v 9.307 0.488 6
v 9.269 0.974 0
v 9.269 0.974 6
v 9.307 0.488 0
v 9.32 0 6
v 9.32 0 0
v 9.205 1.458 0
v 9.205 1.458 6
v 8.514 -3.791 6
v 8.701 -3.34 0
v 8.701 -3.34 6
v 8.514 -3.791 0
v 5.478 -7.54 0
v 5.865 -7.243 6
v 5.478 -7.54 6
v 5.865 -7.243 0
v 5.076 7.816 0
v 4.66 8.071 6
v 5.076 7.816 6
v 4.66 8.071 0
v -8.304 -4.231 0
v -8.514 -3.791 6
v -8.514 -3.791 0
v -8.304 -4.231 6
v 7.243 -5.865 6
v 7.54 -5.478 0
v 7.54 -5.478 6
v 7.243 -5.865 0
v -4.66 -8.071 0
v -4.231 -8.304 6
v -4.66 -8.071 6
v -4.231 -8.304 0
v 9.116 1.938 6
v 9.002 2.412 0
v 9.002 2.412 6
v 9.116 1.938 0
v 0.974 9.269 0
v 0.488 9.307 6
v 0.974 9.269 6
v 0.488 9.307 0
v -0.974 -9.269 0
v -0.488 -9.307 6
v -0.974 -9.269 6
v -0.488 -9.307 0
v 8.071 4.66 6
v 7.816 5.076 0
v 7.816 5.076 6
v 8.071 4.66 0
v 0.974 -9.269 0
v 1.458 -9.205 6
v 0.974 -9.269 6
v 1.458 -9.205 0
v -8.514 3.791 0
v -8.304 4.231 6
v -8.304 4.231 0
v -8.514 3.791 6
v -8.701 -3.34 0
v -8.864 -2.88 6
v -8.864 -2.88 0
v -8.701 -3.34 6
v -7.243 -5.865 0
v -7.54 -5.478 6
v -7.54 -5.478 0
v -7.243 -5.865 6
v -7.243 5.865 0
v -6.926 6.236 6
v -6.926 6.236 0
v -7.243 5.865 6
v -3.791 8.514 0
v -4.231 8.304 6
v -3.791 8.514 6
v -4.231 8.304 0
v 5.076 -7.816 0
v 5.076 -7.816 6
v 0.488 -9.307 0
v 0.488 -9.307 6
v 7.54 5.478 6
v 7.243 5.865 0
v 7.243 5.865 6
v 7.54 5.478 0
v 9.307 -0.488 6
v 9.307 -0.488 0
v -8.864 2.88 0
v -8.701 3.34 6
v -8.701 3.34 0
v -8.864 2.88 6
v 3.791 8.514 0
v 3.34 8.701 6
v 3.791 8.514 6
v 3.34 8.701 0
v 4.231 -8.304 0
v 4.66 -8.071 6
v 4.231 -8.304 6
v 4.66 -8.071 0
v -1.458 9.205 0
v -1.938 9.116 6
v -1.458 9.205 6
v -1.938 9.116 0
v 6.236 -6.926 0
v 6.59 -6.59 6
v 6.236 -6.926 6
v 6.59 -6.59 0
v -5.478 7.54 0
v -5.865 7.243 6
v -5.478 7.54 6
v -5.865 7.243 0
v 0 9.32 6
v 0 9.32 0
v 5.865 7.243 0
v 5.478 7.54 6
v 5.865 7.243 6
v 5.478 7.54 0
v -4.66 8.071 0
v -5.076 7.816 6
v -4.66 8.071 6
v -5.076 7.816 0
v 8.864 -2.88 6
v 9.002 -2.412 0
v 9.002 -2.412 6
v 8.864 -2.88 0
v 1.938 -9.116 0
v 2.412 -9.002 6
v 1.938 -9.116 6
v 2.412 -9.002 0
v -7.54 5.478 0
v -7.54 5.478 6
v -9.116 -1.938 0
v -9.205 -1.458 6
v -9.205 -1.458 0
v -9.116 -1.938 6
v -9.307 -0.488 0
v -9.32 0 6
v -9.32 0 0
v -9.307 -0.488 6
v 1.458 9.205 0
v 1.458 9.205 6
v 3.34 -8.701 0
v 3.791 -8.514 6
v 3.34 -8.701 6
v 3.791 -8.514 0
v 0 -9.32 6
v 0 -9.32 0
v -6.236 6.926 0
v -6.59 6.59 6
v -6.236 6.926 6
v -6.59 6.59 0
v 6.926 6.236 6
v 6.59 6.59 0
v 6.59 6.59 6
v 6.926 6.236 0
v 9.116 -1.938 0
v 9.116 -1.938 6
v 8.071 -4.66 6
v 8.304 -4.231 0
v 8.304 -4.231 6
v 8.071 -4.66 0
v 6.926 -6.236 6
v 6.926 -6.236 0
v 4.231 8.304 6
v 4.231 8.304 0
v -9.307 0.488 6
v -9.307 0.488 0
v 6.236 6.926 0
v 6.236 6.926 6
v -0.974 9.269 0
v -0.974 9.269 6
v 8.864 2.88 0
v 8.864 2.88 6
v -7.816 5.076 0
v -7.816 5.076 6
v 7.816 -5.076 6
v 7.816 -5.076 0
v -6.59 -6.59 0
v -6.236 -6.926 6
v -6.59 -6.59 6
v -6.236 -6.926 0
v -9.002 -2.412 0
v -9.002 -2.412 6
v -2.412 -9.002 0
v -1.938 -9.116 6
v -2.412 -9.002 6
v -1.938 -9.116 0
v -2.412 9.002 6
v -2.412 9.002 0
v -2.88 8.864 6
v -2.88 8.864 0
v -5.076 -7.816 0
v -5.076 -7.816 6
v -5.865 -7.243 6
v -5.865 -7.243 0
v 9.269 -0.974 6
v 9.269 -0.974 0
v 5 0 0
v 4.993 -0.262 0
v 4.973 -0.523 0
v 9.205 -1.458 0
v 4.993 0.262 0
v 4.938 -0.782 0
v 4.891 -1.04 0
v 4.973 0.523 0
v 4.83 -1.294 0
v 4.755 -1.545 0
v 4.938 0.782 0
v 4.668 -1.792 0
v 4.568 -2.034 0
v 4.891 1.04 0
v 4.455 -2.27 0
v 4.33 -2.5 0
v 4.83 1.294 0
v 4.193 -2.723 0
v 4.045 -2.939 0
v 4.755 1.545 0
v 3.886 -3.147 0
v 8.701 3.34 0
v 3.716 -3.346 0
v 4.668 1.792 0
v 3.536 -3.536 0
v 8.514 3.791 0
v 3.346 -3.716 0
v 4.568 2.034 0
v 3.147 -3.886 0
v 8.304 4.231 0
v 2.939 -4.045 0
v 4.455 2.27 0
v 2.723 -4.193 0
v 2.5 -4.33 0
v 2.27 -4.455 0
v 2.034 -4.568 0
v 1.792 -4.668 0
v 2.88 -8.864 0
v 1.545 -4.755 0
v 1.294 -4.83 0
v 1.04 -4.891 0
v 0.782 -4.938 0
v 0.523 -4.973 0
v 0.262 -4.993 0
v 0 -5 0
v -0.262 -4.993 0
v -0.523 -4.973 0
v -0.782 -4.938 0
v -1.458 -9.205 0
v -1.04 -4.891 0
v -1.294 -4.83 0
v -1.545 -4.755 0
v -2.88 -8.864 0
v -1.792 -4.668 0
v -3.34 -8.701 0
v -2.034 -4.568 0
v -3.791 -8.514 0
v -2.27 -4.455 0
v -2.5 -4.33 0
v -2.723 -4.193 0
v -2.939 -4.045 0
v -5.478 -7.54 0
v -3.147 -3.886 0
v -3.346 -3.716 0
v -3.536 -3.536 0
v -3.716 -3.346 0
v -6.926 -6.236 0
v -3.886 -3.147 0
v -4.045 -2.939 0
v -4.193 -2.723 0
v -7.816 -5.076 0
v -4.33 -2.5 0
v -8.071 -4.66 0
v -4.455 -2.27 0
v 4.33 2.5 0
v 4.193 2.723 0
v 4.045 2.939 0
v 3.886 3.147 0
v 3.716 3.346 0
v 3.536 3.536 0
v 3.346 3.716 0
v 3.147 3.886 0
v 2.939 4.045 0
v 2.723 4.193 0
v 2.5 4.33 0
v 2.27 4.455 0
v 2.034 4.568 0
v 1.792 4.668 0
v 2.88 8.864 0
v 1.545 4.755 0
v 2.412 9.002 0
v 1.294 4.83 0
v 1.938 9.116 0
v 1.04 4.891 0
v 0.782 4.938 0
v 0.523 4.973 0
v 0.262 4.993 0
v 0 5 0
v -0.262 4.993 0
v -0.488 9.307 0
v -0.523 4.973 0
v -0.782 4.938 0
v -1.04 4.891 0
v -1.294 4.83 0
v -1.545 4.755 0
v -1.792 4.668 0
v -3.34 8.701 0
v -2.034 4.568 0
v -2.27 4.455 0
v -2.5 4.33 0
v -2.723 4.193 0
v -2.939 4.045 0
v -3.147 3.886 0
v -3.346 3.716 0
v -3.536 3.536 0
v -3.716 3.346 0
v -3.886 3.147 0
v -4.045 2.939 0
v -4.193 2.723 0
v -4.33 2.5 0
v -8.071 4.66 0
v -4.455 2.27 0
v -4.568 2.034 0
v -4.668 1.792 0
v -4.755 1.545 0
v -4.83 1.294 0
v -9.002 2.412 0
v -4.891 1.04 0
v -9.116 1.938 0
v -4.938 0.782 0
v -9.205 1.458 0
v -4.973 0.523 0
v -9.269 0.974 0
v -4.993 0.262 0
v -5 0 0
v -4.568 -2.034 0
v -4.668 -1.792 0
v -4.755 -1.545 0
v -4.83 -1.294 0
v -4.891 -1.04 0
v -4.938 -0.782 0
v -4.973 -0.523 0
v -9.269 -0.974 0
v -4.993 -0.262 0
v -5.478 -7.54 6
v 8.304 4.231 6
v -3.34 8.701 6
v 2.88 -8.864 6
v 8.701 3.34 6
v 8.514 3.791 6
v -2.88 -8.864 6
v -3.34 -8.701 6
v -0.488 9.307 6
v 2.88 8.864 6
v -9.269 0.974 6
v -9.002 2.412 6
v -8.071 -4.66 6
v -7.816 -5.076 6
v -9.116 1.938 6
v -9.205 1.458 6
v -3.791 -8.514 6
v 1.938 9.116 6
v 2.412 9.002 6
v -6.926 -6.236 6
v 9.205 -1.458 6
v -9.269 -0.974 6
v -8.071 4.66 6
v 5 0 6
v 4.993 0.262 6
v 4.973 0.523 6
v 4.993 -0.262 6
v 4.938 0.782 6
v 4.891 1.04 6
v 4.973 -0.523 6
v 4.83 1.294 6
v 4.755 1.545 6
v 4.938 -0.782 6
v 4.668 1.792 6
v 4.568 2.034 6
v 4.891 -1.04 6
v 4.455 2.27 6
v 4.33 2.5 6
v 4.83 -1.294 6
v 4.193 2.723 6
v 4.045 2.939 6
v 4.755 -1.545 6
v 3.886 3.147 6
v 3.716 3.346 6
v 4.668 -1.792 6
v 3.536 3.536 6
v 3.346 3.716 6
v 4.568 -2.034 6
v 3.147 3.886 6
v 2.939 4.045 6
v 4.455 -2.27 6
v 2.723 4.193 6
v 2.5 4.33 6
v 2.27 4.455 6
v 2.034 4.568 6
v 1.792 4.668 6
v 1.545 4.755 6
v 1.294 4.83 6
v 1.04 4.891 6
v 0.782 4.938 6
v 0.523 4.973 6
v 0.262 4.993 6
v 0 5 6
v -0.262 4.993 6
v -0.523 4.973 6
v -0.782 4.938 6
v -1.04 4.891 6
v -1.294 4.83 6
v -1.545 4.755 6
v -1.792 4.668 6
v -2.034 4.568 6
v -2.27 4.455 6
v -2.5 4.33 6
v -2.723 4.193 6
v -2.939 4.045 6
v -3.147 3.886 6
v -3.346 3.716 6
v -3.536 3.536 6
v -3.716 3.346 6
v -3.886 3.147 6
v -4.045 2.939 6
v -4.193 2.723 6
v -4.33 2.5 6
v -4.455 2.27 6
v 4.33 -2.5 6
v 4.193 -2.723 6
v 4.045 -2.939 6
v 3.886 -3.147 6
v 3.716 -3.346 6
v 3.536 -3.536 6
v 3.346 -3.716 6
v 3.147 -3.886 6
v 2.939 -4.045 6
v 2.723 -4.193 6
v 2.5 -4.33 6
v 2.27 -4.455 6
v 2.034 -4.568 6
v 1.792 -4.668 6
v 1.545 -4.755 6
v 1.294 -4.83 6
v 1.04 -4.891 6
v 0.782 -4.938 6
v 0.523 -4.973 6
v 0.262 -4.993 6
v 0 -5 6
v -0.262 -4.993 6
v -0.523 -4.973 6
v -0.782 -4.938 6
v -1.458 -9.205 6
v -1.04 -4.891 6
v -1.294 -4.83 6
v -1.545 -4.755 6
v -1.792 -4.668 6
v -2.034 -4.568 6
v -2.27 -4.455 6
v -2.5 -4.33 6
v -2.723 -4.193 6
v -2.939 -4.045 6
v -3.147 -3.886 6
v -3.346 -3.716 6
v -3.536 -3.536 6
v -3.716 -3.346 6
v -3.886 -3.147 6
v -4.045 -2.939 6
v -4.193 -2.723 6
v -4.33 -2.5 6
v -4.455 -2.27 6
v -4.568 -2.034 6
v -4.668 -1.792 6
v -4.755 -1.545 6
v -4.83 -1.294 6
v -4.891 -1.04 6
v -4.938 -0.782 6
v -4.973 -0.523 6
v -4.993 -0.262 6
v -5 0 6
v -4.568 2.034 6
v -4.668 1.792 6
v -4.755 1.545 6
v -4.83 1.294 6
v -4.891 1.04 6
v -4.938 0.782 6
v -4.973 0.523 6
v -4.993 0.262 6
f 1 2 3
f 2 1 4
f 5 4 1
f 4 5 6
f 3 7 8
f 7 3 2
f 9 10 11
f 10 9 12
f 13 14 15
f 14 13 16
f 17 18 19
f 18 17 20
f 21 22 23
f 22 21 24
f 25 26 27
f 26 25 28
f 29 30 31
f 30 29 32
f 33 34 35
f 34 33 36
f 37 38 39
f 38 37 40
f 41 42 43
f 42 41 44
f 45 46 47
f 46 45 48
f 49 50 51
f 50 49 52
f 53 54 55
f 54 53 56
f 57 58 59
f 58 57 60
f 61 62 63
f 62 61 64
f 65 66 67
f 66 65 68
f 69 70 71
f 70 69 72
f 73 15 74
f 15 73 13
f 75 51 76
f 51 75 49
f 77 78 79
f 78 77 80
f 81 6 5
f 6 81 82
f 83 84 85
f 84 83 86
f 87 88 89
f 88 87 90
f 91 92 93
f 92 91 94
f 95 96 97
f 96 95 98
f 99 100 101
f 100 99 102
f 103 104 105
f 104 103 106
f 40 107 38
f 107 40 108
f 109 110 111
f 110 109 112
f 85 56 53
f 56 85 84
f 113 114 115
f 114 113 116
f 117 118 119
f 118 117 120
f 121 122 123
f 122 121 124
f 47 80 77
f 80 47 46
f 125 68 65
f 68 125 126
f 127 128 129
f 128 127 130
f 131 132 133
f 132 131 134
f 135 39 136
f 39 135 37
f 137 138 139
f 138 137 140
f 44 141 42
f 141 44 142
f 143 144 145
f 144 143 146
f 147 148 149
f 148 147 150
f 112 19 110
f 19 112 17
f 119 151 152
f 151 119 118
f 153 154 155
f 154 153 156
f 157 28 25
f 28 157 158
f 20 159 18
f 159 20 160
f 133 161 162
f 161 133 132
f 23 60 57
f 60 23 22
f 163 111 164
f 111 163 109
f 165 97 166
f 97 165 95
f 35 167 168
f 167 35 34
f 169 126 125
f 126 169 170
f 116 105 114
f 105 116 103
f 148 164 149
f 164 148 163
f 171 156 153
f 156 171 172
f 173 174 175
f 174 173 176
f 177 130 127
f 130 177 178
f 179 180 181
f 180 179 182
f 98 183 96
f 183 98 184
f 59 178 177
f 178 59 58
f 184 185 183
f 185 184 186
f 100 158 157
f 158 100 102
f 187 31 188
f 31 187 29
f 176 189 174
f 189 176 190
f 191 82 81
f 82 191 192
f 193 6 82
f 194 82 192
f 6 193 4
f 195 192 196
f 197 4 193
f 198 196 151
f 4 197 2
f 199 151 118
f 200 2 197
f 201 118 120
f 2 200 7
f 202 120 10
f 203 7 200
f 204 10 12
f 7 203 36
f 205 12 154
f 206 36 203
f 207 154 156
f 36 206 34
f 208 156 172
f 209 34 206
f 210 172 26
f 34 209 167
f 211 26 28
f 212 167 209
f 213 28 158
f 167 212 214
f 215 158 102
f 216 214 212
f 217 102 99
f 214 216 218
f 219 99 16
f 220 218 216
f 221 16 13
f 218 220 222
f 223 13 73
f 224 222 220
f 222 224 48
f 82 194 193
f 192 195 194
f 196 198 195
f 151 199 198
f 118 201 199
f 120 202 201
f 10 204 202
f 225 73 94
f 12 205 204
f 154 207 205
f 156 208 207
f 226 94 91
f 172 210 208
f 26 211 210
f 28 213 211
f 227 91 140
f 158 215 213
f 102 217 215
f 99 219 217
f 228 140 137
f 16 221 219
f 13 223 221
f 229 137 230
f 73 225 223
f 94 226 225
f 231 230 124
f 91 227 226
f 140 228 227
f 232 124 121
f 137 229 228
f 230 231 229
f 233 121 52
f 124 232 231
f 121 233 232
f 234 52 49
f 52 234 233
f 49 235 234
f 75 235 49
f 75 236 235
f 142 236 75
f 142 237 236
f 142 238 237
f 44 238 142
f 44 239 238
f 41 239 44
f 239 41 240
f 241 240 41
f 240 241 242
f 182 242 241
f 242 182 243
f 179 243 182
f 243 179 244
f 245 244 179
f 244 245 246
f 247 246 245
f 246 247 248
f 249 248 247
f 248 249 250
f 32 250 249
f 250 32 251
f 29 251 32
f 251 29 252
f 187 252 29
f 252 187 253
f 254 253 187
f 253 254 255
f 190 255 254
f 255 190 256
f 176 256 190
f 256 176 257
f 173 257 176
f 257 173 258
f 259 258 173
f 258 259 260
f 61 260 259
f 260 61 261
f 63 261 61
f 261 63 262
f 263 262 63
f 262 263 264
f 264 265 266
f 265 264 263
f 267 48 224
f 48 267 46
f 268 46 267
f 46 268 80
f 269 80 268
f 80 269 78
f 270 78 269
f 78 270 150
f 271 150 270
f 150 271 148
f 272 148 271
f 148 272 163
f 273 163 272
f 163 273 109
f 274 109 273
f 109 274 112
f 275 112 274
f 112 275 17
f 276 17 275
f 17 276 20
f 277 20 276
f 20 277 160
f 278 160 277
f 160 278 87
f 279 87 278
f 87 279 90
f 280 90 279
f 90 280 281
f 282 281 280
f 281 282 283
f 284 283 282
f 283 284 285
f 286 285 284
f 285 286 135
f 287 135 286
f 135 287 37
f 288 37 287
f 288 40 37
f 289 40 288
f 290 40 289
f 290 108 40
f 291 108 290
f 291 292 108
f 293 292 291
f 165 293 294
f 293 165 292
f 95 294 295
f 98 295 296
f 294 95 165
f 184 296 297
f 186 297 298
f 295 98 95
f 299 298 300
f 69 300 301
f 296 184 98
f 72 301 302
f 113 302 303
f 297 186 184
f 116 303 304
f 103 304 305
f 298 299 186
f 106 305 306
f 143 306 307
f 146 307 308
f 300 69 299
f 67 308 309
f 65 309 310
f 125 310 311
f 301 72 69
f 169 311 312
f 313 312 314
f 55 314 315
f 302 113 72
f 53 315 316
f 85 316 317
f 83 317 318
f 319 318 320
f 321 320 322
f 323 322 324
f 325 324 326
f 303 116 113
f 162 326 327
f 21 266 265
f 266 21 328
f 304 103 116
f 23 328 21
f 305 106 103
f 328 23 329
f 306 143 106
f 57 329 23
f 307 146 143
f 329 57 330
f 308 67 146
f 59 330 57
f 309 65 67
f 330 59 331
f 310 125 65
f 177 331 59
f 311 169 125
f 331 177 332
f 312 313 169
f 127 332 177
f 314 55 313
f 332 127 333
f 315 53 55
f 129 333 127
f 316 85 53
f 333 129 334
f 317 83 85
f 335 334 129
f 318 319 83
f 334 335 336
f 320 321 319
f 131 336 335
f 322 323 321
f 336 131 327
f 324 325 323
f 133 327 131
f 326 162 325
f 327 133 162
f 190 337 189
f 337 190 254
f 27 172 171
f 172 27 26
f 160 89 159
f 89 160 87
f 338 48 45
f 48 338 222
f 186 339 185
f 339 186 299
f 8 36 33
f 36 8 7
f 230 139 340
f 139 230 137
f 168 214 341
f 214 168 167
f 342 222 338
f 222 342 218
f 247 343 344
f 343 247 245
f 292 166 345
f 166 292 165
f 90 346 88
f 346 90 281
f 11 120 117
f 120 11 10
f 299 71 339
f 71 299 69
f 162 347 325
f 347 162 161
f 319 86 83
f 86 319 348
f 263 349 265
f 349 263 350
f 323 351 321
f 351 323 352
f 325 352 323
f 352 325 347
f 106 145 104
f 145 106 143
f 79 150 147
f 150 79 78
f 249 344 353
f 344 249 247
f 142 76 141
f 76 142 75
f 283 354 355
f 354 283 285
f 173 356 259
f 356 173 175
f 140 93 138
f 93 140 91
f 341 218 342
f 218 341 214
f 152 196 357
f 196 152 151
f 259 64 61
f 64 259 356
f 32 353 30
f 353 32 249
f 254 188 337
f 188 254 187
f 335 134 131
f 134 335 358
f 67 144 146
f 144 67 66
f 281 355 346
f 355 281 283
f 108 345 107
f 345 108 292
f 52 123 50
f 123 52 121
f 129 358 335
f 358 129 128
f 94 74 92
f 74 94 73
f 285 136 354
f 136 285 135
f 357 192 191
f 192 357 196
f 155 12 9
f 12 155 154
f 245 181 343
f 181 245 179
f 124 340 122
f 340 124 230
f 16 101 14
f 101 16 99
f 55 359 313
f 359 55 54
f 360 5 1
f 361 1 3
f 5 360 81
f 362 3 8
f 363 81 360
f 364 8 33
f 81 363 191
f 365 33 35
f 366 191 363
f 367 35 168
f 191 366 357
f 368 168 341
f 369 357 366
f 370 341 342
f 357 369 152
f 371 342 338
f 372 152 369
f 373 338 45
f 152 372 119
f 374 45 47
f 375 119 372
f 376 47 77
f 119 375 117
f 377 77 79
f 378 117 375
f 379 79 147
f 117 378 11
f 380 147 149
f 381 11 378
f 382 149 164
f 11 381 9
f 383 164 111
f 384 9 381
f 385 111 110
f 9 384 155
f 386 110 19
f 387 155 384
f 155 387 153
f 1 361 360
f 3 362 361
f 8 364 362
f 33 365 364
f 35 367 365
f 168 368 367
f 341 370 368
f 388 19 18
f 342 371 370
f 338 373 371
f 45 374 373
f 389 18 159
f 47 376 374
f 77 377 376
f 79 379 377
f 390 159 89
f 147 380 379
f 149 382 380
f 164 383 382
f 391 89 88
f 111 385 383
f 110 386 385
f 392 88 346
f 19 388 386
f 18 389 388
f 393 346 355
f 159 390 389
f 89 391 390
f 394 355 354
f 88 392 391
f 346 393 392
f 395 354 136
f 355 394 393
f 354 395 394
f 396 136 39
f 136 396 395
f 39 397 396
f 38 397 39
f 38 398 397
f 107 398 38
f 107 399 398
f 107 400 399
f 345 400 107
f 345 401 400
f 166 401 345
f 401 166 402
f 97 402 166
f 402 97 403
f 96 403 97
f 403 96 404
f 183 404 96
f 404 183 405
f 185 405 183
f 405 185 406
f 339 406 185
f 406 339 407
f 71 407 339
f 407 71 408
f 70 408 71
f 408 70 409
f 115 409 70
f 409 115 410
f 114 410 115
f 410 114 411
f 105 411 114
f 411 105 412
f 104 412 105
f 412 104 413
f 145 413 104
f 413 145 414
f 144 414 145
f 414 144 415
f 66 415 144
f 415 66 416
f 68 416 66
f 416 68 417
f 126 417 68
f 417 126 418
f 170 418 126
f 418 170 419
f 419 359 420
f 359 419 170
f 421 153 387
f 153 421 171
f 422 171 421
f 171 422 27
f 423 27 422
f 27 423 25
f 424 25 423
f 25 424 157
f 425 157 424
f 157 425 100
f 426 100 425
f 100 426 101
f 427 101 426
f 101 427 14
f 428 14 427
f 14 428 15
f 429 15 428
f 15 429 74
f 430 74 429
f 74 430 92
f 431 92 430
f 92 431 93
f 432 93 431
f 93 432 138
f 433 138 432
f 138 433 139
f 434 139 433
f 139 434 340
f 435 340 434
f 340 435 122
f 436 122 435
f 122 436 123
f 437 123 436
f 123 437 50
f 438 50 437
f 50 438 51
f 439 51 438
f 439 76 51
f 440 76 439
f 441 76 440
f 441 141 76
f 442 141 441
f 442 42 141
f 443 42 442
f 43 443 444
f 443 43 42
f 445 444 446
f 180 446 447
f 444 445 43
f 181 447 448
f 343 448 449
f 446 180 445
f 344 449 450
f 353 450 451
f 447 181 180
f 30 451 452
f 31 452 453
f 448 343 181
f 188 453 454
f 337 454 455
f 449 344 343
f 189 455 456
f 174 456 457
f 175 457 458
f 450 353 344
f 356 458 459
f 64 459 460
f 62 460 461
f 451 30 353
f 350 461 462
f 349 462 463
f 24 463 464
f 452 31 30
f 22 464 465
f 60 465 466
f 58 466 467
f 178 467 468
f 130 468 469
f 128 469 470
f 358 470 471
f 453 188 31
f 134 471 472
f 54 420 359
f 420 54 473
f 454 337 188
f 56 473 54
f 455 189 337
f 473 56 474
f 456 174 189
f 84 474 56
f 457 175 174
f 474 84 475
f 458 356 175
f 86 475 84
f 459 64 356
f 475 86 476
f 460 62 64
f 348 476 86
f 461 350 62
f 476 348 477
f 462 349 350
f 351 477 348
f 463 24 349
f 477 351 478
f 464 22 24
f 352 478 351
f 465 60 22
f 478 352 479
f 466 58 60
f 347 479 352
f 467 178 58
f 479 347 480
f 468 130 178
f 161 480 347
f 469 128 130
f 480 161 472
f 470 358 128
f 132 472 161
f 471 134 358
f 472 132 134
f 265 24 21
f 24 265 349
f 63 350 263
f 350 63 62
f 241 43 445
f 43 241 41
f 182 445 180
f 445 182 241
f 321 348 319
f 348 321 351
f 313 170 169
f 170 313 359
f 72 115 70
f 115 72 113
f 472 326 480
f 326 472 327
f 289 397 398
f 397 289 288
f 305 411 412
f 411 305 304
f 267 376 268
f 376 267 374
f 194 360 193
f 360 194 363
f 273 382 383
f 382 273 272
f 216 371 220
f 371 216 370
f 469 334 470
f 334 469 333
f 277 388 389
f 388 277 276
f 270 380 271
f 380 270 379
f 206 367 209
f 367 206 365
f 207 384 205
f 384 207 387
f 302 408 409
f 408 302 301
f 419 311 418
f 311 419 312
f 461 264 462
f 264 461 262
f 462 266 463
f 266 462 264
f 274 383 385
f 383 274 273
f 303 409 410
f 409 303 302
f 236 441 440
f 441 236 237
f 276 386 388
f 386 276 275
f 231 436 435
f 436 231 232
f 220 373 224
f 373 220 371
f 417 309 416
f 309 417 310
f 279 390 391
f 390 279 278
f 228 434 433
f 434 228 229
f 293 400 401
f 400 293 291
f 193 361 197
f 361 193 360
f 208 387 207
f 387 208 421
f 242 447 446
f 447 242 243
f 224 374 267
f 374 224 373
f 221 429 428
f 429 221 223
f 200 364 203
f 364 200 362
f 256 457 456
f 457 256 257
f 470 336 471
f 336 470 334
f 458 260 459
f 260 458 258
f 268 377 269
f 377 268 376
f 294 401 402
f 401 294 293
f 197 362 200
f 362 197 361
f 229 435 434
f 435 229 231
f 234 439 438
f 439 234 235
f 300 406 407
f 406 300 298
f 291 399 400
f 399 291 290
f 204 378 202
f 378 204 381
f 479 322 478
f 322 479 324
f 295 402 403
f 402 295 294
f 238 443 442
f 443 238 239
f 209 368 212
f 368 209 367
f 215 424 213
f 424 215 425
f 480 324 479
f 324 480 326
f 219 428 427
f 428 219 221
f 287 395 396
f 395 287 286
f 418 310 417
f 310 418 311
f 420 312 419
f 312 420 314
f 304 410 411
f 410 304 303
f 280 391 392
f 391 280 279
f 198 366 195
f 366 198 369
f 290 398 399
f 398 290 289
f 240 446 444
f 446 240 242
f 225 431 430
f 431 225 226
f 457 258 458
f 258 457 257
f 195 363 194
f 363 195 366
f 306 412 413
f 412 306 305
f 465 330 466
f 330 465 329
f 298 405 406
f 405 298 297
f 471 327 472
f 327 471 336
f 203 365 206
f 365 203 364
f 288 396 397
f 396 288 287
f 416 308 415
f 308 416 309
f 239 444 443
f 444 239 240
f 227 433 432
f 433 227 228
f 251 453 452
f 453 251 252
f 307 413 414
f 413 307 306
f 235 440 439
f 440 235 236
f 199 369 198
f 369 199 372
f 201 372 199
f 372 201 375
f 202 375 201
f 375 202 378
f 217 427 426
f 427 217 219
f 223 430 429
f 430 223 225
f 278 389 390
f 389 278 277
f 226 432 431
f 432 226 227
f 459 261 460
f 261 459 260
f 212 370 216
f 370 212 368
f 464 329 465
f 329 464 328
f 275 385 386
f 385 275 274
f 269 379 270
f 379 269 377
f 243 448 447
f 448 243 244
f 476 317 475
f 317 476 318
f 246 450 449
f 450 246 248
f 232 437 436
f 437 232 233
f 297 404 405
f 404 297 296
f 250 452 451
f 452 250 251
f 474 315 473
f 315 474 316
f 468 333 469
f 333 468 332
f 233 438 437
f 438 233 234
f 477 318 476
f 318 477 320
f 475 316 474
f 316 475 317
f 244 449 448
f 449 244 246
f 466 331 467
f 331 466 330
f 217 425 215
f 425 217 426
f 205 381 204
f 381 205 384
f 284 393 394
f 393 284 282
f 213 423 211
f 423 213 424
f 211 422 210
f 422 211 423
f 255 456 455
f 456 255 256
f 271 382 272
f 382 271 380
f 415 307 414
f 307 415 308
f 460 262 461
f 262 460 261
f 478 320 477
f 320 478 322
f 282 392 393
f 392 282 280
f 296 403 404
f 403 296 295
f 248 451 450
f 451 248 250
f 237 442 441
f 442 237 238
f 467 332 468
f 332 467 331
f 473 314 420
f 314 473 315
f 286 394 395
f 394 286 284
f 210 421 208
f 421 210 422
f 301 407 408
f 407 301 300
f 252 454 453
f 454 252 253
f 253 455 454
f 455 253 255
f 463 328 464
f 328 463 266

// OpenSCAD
$fn=120;
id=10;
filament=1.08;
rings=4;
od=id+filament*rings*2;
filament_h=1;
h=6*filament_h;

pad=0.1;
padd=pad*2;

difference() {
    cylinder(h=h,d=od);
    translate([0,0,-pad])
    cylinder(h=h+padd,d=id);
}
